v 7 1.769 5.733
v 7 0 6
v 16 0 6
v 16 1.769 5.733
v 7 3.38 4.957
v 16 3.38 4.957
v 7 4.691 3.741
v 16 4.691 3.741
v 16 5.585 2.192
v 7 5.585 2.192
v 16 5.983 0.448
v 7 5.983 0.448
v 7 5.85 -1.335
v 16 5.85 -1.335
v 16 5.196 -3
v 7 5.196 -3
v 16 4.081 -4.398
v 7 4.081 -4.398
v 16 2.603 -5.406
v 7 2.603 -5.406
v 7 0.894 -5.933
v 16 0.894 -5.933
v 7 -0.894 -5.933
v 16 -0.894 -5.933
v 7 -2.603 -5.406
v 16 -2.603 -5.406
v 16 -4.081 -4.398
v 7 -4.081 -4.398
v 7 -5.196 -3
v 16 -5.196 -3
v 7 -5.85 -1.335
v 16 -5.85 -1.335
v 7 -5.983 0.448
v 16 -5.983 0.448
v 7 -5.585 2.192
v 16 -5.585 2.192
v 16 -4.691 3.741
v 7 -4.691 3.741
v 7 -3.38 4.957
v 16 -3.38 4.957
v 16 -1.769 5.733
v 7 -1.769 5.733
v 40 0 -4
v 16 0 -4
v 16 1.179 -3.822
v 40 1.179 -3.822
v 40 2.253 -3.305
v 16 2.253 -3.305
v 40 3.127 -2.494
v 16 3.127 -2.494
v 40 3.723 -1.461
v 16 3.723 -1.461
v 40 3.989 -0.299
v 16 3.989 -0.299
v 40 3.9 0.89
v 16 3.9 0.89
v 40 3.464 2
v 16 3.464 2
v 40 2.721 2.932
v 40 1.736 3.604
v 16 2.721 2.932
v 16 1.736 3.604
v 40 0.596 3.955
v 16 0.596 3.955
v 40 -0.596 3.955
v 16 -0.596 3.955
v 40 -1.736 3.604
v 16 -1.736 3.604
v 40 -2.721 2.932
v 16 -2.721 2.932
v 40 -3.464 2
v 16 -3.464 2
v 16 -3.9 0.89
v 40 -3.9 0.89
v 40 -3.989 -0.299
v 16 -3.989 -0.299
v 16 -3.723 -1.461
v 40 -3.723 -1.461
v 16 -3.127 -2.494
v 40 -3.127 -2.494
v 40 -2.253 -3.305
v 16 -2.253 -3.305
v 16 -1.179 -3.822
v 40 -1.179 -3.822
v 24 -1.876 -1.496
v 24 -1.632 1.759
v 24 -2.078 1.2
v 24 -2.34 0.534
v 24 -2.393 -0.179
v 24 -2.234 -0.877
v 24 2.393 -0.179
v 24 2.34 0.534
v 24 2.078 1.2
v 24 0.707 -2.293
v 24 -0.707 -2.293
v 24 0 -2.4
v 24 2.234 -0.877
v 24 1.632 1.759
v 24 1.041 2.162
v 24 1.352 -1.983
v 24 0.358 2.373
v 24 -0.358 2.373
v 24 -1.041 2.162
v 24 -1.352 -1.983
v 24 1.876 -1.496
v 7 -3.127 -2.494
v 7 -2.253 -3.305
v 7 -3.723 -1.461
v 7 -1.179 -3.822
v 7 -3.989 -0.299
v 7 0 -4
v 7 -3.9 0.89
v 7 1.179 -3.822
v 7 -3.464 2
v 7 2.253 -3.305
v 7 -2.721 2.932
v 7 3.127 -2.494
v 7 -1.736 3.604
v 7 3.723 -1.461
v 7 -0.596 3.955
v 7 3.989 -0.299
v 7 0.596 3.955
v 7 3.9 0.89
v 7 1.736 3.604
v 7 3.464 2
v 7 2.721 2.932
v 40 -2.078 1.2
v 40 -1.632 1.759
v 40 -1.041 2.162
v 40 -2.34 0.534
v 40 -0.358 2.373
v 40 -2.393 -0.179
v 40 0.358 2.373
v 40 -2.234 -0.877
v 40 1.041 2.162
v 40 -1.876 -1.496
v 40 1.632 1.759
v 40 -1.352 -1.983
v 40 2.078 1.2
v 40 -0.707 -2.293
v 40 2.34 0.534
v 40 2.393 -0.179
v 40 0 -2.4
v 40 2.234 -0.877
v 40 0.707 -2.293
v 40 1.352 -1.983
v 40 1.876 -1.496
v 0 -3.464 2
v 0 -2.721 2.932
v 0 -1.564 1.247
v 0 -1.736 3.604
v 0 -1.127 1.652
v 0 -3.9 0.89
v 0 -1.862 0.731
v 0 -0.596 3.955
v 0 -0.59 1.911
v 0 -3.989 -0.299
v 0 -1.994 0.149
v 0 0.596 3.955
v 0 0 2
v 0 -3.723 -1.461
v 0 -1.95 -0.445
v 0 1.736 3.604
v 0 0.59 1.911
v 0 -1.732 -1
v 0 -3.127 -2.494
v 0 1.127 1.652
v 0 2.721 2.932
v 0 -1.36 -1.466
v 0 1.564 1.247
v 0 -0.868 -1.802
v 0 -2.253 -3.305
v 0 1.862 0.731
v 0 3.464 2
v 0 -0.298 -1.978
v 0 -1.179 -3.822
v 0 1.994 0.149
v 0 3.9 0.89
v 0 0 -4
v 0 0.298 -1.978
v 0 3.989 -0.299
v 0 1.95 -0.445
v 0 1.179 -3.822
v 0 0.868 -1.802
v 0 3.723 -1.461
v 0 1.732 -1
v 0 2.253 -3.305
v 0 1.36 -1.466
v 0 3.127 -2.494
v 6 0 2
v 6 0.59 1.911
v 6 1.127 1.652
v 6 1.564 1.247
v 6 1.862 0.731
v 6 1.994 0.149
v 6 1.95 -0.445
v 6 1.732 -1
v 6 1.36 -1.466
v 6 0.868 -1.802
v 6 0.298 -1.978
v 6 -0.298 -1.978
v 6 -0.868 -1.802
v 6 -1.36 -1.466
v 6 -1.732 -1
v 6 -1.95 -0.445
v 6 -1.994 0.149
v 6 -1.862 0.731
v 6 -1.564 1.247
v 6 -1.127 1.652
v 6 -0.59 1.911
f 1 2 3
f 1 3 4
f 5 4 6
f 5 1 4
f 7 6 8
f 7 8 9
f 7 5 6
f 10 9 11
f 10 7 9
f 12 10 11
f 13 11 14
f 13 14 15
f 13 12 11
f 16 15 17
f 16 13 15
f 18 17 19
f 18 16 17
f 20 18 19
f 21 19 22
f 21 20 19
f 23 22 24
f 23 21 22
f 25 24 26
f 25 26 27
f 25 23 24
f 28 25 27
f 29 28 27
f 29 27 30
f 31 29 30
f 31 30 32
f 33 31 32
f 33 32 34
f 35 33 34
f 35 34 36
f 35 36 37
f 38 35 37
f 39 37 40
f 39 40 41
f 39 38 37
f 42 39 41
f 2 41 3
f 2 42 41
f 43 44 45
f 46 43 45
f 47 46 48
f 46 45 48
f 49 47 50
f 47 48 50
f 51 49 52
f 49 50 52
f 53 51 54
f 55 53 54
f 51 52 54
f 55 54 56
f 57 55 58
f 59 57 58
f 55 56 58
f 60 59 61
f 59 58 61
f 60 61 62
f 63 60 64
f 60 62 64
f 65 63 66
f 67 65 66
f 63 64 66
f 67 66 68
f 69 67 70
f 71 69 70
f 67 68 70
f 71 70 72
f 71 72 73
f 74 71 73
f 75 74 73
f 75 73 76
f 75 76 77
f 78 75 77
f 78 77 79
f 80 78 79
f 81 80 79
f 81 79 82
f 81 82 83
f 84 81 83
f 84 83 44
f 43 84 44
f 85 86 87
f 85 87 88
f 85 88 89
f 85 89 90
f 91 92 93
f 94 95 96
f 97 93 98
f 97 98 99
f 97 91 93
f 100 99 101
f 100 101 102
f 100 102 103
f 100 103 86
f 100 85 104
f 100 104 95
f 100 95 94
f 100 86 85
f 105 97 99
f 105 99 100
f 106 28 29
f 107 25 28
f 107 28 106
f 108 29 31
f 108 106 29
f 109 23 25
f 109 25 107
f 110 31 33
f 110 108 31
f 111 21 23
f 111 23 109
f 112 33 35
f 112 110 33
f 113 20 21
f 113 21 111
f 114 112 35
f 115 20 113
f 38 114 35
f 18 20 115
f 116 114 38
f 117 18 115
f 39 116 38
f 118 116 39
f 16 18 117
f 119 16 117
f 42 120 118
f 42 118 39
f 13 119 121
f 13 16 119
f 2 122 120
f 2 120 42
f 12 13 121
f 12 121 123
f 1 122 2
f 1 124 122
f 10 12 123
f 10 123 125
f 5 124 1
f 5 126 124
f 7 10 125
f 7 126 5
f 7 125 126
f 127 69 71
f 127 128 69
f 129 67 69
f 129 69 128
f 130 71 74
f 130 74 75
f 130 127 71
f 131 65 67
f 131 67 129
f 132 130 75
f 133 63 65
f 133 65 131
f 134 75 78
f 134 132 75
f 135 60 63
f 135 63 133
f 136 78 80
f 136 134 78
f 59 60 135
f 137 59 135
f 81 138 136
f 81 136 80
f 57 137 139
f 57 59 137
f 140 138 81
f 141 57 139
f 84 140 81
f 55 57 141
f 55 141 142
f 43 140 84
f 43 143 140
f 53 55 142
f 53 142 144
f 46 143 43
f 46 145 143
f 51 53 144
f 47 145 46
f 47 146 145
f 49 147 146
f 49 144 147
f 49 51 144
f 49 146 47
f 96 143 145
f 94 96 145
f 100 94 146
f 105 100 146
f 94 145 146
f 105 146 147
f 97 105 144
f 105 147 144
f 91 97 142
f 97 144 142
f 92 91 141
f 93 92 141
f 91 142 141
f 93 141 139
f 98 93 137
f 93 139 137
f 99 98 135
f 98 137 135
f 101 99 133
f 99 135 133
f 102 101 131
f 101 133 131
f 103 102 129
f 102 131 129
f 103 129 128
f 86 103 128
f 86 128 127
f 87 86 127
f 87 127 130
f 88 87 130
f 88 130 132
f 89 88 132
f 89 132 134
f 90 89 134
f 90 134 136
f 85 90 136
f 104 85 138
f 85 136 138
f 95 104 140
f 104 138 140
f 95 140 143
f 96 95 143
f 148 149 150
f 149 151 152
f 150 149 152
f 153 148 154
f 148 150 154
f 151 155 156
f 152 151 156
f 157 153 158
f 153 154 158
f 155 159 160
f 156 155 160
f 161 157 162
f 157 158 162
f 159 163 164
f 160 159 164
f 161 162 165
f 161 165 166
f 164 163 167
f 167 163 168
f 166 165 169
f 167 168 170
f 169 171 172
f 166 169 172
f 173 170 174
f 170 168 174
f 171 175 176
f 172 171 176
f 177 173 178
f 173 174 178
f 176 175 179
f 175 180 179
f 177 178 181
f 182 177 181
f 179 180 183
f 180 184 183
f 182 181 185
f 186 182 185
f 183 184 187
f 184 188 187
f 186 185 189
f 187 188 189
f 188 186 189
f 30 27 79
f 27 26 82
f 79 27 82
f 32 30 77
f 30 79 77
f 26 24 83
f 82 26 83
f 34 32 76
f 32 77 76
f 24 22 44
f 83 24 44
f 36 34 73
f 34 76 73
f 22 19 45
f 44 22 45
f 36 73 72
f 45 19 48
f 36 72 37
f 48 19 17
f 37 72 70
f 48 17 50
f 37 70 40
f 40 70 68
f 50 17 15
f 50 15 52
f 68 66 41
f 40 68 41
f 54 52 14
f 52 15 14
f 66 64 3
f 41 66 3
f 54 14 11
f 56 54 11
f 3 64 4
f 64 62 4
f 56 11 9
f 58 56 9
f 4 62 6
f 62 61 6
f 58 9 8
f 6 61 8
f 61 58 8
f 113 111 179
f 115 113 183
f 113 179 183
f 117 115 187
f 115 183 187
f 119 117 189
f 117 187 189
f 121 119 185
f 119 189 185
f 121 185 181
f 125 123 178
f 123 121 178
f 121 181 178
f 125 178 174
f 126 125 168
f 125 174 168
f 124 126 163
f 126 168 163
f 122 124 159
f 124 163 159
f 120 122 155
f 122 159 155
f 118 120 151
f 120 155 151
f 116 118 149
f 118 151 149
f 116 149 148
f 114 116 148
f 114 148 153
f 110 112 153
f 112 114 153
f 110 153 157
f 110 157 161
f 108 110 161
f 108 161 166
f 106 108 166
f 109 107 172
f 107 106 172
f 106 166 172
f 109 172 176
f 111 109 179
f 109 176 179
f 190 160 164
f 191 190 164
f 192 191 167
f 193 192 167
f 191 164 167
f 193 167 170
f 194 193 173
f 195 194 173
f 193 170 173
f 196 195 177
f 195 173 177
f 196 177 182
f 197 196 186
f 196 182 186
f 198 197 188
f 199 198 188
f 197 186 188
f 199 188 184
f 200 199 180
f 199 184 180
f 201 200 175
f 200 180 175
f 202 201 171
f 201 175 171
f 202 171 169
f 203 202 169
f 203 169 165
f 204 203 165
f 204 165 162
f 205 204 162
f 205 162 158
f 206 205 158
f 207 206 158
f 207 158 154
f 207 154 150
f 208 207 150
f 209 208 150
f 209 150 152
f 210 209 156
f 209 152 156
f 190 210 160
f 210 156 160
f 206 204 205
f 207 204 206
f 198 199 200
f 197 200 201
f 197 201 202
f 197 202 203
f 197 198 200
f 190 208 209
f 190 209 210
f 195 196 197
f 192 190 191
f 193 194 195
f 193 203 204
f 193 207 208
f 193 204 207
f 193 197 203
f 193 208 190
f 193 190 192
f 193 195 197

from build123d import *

# Parameters (mm, degrees)
SKETCH1_R           = 4
BOSS_EXTRUDE1_DEPTH = 40
SKETCH2_R           = 2
CUT_EXTRUDE1_DEPTH  = 6
BOSS_EXTRUDE2_START = -7
SKETCH3_R           = 6
SKETCH3_R_2         = 2
BOSS_EXTRUDE2_DEPTH = 9
SKETCH4_R           = 2.4
CUT_EXTRUDE2_DEPTH  = 16


with BuildPart() as part:
    # Sketch1 → Boss-Extrude1 (new body)
    with BuildSketch(Plane(origin=(0, 0, 0), x_dir=(0, 0, -1), z_dir=(1, 0, 0))):
        Circle(SKETCH1_R)
    extrude(amount=BOSS_EXTRUDE1_DEPTH)

    # Sketch2 → Cut-Extrude1 (cut)
    with BuildSketch(Plane.ZY):
        Circle(SKETCH2_R)
    extrude(amount=-CUT_EXTRUDE1_DEPTH, mode=Mode.SUBTRACT)

    # Sketch3 → Boss-Extrude2 (add)
    with BuildSketch(Plane.ZY.offset(BOSS_EXTRUDE2_START)):
        Circle(SKETCH3_R)
        Circle(SKETCH3_R_2, mode=Mode.SUBTRACT)
    extrude(amount=-BOSS_EXTRUDE2_DEPTH)

    # Sketch4 → Cut-Extrude2 (cut)
    with BuildSketch(Plane(origin=(40, 0, 0), x_dir=(0, 0, -1), z_dir=(1, 0, 0))):
        Circle(SKETCH4_R)
    extrude(amount=-CUT_EXTRUDE2_DEPTH, mode=Mode.SUBTRACT)


solid = part.part
